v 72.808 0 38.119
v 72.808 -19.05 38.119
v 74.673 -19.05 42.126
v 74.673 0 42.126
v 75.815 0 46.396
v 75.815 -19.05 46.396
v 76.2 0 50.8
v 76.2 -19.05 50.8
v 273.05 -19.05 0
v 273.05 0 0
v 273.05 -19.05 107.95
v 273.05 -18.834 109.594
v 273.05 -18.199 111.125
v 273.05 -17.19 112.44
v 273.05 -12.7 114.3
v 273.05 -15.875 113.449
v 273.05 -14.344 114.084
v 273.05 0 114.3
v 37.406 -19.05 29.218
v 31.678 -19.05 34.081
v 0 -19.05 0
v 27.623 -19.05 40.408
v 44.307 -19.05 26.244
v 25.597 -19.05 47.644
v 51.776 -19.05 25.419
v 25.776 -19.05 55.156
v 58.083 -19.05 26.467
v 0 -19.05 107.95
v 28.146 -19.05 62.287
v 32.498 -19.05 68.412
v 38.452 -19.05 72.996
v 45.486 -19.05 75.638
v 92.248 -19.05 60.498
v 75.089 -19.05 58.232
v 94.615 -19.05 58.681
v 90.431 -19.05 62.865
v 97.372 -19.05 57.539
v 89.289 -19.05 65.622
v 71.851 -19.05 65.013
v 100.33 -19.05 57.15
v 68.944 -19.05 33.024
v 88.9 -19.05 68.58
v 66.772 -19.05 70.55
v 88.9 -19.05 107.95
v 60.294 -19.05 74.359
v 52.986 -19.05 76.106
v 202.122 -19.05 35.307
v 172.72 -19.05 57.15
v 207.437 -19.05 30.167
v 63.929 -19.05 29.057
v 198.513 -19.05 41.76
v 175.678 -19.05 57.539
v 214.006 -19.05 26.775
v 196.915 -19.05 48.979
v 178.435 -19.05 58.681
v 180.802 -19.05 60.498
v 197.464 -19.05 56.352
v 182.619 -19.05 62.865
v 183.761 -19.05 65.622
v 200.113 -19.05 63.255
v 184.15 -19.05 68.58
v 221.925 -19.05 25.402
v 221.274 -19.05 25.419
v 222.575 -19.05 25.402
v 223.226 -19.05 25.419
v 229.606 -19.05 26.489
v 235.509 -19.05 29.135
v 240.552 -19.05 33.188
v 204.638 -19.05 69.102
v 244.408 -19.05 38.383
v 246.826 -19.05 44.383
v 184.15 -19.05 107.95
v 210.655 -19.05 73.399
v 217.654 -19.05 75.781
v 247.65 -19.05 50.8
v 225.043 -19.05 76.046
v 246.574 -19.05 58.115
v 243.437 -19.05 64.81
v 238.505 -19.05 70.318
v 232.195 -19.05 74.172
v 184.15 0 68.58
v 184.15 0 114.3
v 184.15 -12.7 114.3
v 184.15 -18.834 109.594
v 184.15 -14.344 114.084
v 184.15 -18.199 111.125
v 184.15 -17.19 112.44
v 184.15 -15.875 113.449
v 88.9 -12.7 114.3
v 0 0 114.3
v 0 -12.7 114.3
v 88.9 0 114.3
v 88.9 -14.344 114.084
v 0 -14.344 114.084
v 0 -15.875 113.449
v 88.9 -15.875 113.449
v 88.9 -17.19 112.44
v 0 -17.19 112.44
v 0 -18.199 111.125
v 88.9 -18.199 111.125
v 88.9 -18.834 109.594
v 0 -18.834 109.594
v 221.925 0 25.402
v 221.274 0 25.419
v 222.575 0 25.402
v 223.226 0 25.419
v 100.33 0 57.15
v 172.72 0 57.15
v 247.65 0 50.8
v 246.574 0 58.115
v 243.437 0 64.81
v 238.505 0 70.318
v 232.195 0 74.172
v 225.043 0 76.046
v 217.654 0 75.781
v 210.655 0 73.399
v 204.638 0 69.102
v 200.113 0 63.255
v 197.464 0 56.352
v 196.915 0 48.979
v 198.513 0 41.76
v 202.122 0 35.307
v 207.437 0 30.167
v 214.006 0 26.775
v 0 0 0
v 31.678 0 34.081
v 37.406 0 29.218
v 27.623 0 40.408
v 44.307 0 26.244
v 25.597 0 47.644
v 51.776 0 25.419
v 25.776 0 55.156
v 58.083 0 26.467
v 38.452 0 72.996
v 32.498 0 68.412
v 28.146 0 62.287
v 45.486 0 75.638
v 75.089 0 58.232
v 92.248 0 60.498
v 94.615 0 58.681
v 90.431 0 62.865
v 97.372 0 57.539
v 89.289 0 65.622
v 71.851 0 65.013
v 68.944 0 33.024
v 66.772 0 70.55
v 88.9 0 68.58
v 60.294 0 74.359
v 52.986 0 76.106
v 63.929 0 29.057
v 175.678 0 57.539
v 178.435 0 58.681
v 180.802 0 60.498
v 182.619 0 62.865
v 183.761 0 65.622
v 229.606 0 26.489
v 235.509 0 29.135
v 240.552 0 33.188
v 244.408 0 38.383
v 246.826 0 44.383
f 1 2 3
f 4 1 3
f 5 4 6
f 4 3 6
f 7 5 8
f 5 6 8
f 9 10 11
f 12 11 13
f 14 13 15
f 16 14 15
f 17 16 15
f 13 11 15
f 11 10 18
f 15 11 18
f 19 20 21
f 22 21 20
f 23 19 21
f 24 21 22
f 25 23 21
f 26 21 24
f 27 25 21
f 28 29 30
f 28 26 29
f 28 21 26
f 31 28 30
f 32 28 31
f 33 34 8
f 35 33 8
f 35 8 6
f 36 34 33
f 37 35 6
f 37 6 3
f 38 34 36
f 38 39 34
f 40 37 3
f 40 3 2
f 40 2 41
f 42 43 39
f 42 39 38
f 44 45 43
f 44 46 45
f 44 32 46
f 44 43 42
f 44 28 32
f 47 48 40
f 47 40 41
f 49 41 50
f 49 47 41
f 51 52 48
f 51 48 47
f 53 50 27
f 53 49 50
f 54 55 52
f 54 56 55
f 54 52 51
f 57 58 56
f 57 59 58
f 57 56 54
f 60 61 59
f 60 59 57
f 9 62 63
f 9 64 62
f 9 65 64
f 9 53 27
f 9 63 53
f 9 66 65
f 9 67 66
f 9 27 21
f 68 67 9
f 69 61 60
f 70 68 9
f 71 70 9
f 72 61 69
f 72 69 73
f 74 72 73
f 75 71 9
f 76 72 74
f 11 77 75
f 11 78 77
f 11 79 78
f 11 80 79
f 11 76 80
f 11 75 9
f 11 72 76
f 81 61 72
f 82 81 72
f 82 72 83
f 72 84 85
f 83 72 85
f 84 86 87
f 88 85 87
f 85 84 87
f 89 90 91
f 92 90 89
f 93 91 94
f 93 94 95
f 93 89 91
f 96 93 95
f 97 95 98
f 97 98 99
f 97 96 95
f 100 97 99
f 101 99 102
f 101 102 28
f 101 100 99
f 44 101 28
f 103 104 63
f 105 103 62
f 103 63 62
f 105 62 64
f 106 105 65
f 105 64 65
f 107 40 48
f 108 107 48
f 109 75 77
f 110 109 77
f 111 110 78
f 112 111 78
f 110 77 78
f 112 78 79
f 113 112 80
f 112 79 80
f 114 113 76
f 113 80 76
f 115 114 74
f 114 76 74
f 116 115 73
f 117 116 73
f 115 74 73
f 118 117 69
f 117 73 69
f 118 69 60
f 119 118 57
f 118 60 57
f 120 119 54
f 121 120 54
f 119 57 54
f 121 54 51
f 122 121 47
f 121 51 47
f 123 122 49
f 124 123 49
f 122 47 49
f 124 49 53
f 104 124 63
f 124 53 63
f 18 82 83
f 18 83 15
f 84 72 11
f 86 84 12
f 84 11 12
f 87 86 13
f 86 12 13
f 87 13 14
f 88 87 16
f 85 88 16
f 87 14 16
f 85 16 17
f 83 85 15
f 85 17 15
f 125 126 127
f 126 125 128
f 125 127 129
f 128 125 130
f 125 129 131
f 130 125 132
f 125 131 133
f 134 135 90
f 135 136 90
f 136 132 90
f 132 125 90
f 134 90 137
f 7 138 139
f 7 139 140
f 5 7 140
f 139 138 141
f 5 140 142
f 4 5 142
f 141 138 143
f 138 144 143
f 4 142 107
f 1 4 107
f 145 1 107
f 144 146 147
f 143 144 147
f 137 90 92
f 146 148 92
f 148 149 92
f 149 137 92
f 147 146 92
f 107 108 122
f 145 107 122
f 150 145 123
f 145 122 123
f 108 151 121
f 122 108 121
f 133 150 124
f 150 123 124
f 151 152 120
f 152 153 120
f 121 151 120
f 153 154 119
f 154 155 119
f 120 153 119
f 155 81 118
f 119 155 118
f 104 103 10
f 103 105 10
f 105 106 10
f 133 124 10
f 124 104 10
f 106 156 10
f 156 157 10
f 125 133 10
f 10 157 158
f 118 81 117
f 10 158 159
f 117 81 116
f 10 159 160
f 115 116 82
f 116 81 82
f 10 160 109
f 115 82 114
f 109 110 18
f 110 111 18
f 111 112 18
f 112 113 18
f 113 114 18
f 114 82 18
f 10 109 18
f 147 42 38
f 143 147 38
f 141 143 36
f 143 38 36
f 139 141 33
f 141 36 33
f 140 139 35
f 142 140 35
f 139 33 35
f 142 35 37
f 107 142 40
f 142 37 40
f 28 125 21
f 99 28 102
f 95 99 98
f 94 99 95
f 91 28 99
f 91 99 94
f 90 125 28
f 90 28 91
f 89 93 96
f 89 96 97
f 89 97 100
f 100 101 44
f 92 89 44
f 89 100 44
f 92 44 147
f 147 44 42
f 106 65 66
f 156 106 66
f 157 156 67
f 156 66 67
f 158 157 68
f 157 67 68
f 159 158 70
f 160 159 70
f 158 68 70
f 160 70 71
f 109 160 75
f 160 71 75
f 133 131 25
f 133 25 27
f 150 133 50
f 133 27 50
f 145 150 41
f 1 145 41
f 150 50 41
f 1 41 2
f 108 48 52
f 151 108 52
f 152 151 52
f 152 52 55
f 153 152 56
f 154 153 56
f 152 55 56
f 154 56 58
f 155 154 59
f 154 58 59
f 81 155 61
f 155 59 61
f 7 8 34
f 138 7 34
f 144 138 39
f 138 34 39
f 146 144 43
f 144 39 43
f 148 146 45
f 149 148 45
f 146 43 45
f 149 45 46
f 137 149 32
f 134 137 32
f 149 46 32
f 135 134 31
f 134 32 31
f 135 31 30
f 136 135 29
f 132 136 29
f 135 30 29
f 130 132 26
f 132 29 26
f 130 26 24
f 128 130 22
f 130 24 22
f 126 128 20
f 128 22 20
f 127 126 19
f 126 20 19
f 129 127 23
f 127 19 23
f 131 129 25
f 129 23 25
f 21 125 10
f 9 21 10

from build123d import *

# Parameters (mm, degrees)
F0_W     = 273.05
F0_H     = 114.3
F1_DEPTH = 19.05
F3_DEPTH = 25.4
F4_DEPTH = 25.4
F5_R     = 6.35
F6_R     = 6.35


with BuildPart() as f1:
    # F0 (on Front) → F1 (new body)
    with BuildSketch(Plane.XZ):
        with Locations((136.525, 57.15)):
            Rectangle(F0_W, F0_H)
    extrude(amount=F1_DEPTH)

    # F2 (on face) → F3 (cut)
    with BuildSketch(Plane.XZ.offset(19.05)):
        with BuildLine():
            ThreePointArc((72.8078575524, 38.1187458841), (75.3373142564, 44.2364484398), (76.2, 50.8))
            ThreePointArc((76.2, 50.8), (32.4977854296, 68.4121816315), (51.7756738724, 25.4187458841))
            Line((51.7756738724, 25.4187458841), (64.3298327923, 38.1187458841))
            Line((64.3298327923, 38.1187458841), (72.8078575524, 38.1187458841))
        make_face()
        with BuildLine():
            ThreePointArc((200.2421424476, 38.1187458841), (209.1205225089, 29.0565683295), (221.2743261276, 25.4187458841))
            Line((221.2743261276, 25.4187458841), (223.2256738724, 25.4187458841))
            Line((223.2256738724, 25.4187458841), (207.7043950558, 38.1187458841))
            Line((207.7043950558, 38.1187458841), (200.2421424476, 38.1187458841))
        make_face()
        with BuildLine():
            Line((223.2256738724, 25.4187458841), (221.2743261276, 25.4187458841))
            ThreePointArc((221.2743261276, 25.4187458841), (222.25, 25.4), (223.2256738724, 25.4187458841))
        make_face()
        with BuildLine():
            Line((64.3298327923, 38.1187458841), (51.7756738724, 25.4187458841))
            ThreePointArc((51.7756738724, 25.4187458841), (63.9294774911, 29.0565683295), (72.8078575524, 38.1187458841))
            Line((72.8078575524, 38.1187458841), (64.3298327923, 38.1187458841))
        make_face()
        with BuildLine():
            ThreePointArc((247.65, 50.8), (215.6864484398, 75.3373142564), (200.2421424476, 38.1187458841))
            Line((200.2421424476, 38.1187458841), (207.7043950558, 38.1187458841))
            Line((207.7043950558, 38.1187458841), (223.2256738724, 25.4187458841))
            ThreePointArc((223.2256738724, 25.4187458841), (240.5522145704, 33.1878183685), (247.65, 50.8))
        make_face()
        with BuildLine():
            Line((100.33, 57.15), (151.0539650917, 57.15))
            Line((151.0539650917, 57.15), (172.72, 57.15))
            ThreePointArc((172.72, 57.15), (180.802230509, 60.497769491), (184.15, 68.58))
            Line((184.15, 68.58), (184.15, 114.3))
            Line((184.15, 114.3), (88.9, 114.3))
            Line((88.9, 114.3), (88.9, 68.58))
            ThreePointArc((88.9, 68.58), (92.247769491, 60.497769491), (100.33, 57.15))
        make_face()
    extrude(amount=-F3_DEPTH, mode=Mode.SUBTRACT)

    # F2 (on face) → F4 (cut)
    with BuildSketch(Plane.XZ.offset(19.05)):
        with BuildLine():
            ThreePointArc((72.8078575524, 38.1187458841), (75.3373142564, 44.2364484398), (76.2, 50.8))
            ThreePointArc((76.2, 50.8), (32.4977854296, 68.4121816315), (51.7756738724, 25.4187458841))
            Line((51.7756738724, 25.4187458841), (64.3298327923, 38.1187458841))
            Line((64.3298327923, 38.1187458841), (72.8078575524, 38.1187458841))
        make_face()
        with BuildLine():
            ThreePointArc((200.2421424476, 38.1187458841), (209.1205225089, 29.0565683295), (221.2743261276, 25.4187458841))
            Line((221.2743261276, 25.4187458841), (223.2256738724, 25.4187458841))
            Line((223.2256738724, 25.4187458841), (207.7043950558, 38.1187458841))
            Line((207.7043950558, 38.1187458841), (200.2421424476, 38.1187458841))
        make_face()
        with BuildLine():
            Line((223.2256738724, 25.4187458841), (221.2743261276, 25.4187458841))
            ThreePointArc((221.2743261276, 25.4187458841), (222.25, 25.4), (223.2256738724, 25.4187458841))
        make_face()
        with BuildLine():
            Line((64.3298327923, 38.1187458841), (51.7756738724, 25.4187458841))
            ThreePointArc((51.7756738724, 25.4187458841), (63.9294774911, 29.0565683295), (72.8078575524, 38.1187458841))
            Line((72.8078575524, 38.1187458841), (64.3298327923, 38.1187458841))
        make_face()
        with BuildLine():
            ThreePointArc((247.65, 50.8), (215.6864484398, 75.3373142564), (200.2421424476, 38.1187458841))
            Line((200.2421424476, 38.1187458841), (207.7043950558, 38.1187458841))
            Line((207.7043950558, 38.1187458841), (223.2256738724, 25.4187458841))
            ThreePointArc((223.2256738724, 25.4187458841), (240.5522145704, 33.1878183685), (247.65, 50.8))
        make_face()
    extrude(amount=-F4_DEPTH, mode=Mode.SUBTRACT)

    # F5
    f5_edges = [f1.edges().sort_by_distance(p)[0] for p in [
        (44.45, -19.05, 114.3),
    ]]
    fillet(f5_edges, radius=F5_R)

    # F6
    f6_edges = [f1.edges().sort_by_distance(p)[0] for p in [
        (228.6, -19.05, 114.3),
    ]]
    fillet(f6_edges, radius=F6_R)


solid = f1.part
